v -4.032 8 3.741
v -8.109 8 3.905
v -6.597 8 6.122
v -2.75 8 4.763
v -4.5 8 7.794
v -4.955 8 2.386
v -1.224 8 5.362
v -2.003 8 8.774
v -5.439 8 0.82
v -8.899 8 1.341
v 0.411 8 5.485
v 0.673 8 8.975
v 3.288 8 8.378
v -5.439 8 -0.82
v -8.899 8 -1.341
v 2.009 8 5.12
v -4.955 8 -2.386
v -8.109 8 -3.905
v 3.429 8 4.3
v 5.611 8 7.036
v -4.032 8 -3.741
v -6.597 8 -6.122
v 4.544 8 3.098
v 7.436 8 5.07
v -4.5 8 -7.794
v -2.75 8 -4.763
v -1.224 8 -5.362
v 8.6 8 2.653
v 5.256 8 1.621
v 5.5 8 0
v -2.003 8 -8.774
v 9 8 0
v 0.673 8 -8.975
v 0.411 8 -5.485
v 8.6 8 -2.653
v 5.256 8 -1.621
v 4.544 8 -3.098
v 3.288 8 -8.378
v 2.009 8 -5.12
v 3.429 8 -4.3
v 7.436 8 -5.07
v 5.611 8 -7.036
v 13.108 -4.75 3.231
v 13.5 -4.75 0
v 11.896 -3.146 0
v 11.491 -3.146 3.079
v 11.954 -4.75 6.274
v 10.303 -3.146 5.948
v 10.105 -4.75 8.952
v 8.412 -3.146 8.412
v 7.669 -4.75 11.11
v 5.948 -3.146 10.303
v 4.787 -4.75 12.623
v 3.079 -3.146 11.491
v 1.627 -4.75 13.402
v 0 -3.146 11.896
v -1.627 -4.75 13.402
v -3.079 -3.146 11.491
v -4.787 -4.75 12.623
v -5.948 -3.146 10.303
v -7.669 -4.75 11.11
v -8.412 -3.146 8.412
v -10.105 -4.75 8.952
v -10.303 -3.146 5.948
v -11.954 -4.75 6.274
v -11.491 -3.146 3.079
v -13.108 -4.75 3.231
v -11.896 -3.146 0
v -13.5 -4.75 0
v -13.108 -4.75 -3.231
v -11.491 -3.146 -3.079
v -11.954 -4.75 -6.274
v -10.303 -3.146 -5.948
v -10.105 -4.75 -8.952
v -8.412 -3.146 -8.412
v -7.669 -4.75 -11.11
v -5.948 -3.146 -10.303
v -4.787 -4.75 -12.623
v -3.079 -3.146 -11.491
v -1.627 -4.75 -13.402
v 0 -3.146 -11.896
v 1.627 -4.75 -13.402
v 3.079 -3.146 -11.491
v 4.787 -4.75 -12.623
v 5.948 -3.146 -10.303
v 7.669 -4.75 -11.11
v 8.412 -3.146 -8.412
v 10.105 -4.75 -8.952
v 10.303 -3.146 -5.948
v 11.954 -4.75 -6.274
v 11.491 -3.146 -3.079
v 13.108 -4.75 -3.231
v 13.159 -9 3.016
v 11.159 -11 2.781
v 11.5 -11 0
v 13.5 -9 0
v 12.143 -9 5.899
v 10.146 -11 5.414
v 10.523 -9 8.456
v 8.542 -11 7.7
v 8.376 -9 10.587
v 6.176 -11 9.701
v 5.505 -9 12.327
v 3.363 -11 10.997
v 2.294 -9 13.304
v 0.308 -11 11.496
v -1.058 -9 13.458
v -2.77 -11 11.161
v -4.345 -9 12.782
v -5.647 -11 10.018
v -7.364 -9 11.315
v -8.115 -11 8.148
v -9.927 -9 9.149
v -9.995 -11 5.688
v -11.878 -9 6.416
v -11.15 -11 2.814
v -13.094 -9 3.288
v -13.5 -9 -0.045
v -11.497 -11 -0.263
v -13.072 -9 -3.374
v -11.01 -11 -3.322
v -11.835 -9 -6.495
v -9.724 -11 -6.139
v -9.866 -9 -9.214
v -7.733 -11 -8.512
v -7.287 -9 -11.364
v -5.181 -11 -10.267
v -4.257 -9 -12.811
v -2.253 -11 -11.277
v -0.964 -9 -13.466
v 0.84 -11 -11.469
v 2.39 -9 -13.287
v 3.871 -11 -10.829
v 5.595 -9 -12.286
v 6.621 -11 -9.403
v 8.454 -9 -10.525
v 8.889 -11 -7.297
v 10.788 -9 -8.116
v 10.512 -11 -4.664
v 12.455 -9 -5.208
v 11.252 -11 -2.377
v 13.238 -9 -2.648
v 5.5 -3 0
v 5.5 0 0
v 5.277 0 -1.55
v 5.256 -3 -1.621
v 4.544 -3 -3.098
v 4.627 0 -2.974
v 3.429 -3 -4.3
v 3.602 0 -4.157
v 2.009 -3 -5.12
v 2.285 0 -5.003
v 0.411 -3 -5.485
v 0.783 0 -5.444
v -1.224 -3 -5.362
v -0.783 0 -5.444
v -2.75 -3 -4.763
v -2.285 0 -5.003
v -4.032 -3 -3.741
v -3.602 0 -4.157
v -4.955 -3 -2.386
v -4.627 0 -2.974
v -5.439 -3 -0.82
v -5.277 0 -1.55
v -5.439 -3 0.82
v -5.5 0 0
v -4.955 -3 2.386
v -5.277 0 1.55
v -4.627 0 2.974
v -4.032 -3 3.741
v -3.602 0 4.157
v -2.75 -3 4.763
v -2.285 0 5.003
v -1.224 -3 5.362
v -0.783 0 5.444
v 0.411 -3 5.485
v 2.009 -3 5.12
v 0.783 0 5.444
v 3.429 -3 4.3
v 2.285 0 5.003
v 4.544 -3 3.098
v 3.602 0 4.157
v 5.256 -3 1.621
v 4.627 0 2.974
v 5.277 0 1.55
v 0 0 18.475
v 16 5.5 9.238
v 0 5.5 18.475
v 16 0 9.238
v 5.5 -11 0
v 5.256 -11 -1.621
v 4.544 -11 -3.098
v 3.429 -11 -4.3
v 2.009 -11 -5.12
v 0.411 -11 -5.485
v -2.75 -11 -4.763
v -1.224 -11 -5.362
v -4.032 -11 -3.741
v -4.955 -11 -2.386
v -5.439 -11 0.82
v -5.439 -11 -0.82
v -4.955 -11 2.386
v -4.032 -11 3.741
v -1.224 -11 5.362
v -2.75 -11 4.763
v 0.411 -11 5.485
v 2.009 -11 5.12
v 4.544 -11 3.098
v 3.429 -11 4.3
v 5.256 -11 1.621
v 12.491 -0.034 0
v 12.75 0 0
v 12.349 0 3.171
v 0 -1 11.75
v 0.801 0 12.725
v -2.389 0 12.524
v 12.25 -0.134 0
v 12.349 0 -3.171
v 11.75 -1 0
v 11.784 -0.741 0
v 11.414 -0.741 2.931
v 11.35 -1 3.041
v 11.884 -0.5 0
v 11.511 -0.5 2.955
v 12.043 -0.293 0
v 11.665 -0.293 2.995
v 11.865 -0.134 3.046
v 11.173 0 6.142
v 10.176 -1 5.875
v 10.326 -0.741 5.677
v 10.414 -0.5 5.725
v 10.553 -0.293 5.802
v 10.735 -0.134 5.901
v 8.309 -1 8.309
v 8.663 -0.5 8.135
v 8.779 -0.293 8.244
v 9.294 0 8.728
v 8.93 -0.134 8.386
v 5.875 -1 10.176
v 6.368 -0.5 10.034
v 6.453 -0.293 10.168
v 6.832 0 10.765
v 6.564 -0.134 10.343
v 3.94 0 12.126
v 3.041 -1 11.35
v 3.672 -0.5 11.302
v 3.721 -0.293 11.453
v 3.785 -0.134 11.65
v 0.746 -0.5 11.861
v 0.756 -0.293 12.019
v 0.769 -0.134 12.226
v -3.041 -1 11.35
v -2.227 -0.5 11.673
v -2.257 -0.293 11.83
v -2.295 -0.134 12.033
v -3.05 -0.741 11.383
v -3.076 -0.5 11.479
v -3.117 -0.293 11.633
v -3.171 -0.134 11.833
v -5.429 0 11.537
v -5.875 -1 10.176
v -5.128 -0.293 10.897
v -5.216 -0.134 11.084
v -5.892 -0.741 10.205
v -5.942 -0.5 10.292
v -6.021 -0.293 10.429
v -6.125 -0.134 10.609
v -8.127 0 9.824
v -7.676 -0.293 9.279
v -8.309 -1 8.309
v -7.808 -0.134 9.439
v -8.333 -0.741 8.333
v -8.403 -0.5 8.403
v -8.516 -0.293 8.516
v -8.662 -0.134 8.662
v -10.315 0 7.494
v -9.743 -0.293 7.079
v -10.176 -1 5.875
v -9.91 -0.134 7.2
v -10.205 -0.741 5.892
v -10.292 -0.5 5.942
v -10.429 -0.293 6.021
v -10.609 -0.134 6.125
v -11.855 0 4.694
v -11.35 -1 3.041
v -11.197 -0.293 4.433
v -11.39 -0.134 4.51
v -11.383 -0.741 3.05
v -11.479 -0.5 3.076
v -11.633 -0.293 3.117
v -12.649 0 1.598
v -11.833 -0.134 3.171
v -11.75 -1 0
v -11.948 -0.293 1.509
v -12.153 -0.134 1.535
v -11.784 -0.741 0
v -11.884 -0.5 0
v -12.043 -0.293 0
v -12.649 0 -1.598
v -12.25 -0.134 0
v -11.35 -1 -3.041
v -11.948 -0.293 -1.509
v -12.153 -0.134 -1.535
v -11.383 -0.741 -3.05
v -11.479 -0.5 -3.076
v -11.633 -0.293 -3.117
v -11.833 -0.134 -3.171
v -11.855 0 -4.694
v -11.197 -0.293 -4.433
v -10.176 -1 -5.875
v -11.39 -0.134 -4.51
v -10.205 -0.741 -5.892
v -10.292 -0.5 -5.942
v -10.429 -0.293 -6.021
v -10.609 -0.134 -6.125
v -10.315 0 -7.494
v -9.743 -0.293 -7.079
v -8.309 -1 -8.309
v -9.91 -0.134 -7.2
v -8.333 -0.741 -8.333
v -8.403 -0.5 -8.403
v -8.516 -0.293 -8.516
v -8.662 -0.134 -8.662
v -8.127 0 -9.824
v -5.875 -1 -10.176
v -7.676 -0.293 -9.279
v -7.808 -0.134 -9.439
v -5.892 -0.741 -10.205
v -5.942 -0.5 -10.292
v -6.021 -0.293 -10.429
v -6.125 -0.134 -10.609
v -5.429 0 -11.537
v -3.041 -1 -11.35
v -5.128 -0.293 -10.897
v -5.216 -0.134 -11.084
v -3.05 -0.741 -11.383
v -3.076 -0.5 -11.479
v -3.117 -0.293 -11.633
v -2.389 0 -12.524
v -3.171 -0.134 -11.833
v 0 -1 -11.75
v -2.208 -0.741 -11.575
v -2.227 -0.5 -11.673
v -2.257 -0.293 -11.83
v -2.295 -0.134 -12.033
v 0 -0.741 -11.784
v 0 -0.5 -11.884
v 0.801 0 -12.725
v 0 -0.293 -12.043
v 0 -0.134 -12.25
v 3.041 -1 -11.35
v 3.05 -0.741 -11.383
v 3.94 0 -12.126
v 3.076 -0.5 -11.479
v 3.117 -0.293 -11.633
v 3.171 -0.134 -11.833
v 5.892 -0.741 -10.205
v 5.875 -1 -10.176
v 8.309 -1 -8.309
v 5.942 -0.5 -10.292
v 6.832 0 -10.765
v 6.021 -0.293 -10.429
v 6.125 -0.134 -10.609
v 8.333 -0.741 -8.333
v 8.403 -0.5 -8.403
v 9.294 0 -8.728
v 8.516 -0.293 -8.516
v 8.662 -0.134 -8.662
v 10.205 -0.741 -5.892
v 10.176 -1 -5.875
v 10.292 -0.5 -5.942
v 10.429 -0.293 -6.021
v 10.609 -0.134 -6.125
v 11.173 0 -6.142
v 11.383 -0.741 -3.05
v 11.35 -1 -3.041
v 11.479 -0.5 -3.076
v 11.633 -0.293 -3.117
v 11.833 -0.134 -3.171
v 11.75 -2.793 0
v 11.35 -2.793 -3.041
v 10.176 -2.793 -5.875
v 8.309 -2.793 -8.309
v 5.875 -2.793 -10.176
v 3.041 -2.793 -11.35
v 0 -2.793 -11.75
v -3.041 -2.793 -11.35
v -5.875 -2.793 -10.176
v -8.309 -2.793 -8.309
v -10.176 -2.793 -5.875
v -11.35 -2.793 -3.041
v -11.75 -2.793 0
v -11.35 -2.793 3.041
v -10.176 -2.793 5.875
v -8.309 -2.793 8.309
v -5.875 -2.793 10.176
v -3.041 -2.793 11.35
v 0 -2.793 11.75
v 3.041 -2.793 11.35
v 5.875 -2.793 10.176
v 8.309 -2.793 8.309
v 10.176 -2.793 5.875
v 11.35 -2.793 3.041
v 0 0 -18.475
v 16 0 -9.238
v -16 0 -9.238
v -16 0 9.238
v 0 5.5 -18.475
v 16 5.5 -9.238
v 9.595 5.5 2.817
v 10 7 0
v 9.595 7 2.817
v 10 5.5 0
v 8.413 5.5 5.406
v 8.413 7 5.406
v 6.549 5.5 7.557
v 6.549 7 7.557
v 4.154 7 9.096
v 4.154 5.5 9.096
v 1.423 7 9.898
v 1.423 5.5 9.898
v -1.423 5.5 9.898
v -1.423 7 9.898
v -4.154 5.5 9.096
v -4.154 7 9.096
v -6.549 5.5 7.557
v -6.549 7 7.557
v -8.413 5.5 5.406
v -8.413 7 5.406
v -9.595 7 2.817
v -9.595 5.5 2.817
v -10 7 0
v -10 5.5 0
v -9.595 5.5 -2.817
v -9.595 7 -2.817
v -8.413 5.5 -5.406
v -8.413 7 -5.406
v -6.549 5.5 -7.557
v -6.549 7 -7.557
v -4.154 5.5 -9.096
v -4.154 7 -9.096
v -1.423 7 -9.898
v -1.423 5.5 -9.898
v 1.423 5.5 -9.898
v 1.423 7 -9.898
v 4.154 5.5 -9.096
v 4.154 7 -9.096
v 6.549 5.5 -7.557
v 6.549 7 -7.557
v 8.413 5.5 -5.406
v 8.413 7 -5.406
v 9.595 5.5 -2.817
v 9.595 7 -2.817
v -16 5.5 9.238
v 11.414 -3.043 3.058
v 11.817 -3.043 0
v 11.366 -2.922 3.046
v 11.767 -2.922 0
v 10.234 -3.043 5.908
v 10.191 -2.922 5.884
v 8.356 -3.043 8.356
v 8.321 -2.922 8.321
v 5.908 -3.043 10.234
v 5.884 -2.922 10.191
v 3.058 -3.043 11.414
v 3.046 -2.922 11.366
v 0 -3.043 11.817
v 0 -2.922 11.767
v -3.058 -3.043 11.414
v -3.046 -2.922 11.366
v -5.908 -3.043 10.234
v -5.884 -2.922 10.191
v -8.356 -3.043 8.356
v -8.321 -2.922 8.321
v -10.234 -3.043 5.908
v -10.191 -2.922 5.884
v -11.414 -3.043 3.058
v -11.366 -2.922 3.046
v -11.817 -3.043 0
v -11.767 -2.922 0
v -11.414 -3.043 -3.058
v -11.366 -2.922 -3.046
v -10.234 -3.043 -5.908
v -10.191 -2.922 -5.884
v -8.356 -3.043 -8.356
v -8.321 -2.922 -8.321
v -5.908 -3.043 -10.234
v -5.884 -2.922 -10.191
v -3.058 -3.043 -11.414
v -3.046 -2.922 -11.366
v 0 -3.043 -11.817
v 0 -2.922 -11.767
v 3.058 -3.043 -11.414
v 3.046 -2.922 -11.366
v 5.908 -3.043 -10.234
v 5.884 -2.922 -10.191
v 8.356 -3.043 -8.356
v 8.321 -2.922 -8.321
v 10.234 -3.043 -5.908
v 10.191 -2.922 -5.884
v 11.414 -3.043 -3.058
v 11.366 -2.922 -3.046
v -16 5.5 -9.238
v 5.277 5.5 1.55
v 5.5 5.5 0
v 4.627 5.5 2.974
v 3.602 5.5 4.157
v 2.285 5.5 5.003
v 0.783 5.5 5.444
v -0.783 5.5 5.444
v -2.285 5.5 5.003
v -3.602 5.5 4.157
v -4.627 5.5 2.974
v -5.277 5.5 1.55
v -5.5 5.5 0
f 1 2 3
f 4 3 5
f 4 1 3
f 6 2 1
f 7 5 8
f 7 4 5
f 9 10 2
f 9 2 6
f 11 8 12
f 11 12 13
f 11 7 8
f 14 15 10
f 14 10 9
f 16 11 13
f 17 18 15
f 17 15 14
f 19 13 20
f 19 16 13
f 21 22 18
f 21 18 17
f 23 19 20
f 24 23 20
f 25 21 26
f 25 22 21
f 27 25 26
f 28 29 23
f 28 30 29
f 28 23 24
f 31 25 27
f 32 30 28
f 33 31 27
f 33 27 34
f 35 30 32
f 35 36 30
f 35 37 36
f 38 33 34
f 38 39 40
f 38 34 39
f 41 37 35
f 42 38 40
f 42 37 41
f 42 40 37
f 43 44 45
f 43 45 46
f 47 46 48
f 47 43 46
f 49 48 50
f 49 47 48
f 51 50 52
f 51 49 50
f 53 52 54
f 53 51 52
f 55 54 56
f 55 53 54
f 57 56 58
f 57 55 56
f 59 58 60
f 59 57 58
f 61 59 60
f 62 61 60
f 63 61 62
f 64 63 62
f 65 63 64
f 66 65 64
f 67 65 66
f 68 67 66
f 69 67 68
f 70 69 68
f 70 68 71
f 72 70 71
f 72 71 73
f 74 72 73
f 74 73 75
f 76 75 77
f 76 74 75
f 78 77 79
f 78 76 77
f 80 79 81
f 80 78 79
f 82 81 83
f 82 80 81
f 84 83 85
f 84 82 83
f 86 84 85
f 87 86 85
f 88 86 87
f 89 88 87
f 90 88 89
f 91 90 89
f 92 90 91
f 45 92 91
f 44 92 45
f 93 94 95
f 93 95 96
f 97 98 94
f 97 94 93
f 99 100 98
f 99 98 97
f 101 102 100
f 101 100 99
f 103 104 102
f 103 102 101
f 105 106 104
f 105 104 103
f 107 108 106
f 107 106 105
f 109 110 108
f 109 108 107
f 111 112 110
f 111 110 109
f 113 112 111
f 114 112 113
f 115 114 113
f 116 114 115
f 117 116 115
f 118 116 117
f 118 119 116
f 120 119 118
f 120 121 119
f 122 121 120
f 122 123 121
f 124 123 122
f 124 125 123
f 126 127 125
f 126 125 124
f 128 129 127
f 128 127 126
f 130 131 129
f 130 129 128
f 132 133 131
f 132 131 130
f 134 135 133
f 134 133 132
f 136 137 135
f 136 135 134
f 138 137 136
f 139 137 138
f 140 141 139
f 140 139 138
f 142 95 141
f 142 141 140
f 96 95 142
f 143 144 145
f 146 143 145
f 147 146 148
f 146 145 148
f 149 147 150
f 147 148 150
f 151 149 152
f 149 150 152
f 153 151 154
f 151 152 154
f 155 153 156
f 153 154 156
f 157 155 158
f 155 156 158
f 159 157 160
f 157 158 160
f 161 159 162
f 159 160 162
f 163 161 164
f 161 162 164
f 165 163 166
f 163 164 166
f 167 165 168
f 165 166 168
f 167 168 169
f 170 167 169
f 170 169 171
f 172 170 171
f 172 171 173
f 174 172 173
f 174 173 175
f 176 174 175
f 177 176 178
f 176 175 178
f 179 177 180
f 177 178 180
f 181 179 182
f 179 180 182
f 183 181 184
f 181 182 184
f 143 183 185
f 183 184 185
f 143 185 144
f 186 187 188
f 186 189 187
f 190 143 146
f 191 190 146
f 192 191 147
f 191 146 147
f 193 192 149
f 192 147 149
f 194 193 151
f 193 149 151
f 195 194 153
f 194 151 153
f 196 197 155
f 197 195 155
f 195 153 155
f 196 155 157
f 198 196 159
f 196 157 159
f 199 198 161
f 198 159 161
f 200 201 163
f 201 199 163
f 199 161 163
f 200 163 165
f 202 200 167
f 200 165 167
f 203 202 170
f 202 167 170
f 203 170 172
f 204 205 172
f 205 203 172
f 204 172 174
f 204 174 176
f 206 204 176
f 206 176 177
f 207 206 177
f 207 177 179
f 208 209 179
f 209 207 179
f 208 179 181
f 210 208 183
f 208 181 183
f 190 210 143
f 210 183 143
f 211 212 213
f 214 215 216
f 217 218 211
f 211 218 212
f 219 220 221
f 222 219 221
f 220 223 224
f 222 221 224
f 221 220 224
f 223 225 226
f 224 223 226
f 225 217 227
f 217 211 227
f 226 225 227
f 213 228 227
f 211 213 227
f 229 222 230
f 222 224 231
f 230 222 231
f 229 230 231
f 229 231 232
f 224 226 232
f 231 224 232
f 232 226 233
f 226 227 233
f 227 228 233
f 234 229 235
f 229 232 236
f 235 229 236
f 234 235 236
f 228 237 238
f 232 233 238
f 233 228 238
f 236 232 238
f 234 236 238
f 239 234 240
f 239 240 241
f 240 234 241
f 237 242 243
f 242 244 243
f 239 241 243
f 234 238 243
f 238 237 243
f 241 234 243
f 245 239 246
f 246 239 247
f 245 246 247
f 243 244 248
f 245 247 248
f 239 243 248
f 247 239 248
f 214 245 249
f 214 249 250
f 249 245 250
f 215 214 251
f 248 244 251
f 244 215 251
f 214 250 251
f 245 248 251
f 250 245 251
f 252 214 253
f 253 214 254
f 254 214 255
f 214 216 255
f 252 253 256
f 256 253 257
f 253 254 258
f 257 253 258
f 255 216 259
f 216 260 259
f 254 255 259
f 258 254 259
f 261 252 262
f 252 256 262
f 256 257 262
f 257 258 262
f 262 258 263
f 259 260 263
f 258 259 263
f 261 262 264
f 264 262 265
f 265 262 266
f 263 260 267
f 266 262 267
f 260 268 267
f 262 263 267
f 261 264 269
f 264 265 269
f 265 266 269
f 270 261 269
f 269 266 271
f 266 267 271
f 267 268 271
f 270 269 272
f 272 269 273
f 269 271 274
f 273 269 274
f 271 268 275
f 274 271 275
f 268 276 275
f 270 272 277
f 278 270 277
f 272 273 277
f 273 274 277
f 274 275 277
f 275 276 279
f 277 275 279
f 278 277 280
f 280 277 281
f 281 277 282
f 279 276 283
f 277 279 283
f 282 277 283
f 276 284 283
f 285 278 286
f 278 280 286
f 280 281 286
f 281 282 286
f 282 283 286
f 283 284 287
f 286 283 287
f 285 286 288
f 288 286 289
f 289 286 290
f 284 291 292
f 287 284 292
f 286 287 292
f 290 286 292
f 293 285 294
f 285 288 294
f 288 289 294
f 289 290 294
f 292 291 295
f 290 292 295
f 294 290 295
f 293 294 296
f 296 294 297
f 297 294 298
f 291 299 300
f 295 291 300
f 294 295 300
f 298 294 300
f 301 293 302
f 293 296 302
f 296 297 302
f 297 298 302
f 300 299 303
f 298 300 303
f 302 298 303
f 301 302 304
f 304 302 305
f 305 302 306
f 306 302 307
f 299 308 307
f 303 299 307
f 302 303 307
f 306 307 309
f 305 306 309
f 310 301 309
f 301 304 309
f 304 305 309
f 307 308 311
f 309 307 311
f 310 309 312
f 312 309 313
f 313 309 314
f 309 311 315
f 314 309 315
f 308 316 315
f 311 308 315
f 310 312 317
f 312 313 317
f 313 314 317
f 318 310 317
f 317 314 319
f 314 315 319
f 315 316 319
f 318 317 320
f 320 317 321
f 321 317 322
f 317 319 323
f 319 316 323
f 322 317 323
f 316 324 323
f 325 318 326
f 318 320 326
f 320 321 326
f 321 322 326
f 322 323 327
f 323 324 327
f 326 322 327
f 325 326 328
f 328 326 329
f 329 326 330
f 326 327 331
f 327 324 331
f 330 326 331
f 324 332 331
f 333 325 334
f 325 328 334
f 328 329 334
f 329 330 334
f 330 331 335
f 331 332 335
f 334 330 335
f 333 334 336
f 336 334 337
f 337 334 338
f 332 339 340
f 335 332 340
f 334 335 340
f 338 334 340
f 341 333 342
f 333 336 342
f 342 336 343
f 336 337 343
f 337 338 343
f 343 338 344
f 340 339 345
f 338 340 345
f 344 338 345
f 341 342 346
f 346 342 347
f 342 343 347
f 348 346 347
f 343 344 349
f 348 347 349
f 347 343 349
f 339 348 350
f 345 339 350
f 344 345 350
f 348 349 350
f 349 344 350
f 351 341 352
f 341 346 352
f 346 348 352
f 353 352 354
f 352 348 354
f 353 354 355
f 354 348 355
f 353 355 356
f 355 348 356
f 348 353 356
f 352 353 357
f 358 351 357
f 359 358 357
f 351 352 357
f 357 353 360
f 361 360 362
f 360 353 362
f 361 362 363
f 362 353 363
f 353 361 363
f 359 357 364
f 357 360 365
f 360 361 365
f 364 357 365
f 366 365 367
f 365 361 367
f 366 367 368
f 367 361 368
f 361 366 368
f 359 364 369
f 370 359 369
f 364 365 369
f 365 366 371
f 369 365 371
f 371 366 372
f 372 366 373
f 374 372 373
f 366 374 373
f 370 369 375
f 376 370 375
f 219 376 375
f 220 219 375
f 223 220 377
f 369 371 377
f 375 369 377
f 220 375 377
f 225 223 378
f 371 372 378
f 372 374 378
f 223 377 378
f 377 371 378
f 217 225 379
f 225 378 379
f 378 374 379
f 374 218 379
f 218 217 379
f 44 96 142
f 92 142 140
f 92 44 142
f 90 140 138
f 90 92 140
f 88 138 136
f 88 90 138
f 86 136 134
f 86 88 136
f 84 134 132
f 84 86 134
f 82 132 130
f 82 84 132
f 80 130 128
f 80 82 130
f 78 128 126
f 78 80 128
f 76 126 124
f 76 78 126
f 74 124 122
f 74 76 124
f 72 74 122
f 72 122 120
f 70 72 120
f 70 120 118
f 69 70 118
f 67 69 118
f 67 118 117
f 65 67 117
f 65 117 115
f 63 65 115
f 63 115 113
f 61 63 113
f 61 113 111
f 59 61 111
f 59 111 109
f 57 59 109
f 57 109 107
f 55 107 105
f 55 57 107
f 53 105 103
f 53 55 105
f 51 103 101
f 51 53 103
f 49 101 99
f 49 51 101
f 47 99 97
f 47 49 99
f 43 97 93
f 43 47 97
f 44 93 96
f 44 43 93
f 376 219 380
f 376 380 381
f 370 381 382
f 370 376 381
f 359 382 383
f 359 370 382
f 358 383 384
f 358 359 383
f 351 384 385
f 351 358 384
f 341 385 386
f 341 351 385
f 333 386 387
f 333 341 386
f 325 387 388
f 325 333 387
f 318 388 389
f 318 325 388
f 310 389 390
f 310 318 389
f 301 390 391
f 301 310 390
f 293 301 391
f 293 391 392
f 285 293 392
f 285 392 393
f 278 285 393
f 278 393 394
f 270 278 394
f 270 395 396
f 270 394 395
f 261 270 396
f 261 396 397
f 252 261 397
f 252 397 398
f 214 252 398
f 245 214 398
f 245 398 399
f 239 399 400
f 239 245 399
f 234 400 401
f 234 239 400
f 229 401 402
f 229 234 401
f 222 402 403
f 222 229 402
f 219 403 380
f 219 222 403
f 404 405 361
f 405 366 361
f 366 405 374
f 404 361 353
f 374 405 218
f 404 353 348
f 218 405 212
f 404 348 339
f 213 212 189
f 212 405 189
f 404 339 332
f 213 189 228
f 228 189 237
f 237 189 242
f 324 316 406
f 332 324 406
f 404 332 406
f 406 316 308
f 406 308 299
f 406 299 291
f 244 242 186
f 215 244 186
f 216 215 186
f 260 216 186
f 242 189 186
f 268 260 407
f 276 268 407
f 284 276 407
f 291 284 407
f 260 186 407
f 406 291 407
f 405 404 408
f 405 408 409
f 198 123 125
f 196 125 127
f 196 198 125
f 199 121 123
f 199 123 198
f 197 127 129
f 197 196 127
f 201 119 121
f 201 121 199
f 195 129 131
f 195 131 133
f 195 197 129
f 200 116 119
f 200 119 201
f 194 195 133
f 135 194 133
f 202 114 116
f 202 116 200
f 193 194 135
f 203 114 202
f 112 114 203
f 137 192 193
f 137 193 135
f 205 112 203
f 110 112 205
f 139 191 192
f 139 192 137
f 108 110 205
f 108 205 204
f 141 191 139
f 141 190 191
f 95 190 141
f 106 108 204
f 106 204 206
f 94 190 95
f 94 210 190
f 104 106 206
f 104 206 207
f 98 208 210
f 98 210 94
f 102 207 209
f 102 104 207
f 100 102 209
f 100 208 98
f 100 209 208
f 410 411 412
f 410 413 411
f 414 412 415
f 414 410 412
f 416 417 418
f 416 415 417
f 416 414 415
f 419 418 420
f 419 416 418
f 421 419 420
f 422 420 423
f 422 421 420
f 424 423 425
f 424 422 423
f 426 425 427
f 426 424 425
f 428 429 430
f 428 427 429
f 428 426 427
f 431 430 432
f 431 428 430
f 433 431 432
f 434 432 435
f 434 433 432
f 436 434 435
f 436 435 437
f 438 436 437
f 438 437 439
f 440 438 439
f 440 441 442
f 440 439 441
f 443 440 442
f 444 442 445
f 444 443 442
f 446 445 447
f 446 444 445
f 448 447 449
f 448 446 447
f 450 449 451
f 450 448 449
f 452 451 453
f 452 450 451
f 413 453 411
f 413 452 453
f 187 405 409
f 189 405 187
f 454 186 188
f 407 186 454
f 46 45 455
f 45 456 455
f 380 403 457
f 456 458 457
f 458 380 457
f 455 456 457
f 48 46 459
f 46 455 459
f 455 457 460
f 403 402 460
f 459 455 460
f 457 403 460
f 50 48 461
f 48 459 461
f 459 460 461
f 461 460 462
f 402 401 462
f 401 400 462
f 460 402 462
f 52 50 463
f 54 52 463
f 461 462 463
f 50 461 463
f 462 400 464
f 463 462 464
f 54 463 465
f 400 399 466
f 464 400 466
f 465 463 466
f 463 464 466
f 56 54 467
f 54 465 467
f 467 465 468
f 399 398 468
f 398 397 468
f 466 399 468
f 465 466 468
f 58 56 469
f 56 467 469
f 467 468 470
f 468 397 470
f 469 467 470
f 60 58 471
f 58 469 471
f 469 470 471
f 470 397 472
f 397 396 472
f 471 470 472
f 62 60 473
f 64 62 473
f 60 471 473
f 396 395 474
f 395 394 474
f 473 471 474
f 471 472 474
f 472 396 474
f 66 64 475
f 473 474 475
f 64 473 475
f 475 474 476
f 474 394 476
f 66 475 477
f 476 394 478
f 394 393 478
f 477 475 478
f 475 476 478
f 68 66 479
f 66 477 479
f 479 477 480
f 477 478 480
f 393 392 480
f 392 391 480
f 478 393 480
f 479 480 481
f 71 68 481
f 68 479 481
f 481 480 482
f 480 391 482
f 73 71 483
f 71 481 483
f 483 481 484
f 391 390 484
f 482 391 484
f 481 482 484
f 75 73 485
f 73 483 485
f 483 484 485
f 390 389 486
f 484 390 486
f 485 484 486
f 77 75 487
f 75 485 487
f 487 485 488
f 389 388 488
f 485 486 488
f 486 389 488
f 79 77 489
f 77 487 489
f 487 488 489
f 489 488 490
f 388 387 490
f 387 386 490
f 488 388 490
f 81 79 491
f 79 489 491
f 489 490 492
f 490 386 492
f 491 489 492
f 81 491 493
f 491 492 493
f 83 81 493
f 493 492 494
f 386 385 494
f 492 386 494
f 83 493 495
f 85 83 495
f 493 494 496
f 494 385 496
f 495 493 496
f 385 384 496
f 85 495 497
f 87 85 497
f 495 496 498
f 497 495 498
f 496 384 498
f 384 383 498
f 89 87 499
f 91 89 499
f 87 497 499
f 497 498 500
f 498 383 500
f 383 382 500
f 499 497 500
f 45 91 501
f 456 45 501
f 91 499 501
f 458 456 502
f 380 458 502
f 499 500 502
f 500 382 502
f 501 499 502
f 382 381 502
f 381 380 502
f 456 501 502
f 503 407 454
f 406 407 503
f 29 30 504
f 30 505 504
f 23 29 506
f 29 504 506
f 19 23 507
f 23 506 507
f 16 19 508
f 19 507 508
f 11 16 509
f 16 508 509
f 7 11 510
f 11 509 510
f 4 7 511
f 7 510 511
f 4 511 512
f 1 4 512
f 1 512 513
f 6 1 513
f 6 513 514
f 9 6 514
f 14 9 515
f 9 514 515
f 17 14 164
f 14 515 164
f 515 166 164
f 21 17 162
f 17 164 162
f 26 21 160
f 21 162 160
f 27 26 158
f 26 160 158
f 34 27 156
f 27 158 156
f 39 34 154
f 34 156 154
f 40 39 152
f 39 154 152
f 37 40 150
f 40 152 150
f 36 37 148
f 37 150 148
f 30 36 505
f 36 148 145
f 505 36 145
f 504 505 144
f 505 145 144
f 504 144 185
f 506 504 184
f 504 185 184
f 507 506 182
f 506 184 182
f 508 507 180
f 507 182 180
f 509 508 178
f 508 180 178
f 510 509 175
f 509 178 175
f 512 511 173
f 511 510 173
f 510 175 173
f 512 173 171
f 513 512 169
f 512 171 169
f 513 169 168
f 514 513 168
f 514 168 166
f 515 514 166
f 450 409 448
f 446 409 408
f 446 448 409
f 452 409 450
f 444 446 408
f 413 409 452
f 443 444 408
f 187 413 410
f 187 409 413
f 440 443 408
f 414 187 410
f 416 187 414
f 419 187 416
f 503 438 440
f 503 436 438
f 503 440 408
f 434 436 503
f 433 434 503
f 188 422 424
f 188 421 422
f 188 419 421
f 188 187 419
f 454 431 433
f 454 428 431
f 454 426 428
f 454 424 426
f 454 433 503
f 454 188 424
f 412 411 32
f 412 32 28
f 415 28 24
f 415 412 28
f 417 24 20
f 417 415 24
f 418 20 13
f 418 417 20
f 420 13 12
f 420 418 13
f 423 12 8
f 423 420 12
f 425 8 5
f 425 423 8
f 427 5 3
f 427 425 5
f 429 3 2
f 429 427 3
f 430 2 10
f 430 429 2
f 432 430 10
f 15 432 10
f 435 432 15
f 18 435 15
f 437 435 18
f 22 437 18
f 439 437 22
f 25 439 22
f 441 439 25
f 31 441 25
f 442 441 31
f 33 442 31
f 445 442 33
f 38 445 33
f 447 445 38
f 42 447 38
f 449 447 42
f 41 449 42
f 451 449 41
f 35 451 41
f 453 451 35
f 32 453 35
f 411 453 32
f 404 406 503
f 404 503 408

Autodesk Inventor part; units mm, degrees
ref_plane "YZ Plane" through (0, 0, 0) normal (1, 0, 0) x (0, 1, 0)
ref_plane "XZ Plane" through (0, 0, 0) normal (0, 1, 0) x (-1, 0, 0)
ref_plane "XY Plane" through (0, 0, 0) normal (0, 0, 1) x (1, 0, 0)
sketch "Эскиз1" plane through (0, 0, 0) normal (0, 0, 1) x (1, 0, 0)
  point P0 (0, 0)
sketch "Эскиз2" plane through (0, 0, 0) normal (0, 1, 0) x (-1, 0, 0)
  line L0 (0, 18.4752) -> (16, 9.2376)
  line L1 (16, 9.2376) -> (16, -9.2376)
  line L2 (16, -9.2376) -> (0, -18.4752)
  line L3 (0, -18.4752) -> (-16, -9.2376)
  line L4 (-16, -9.2376) -> (-16, 9.2376)
  line L5 (-16, 9.2376) -> (0, 18.4752)
  circle A0 centre (0, 0) radius 5.5
  dimension "d0" = 32
  dimension "d1" = 11
extrude "Выдавливание1" add sketch "Эскиз2" along normal blind 5.5
sketch "Эскиз3" plane through (0, 5.5, 0) normal (0, 1, 0) x (1, 0, 0)
  circle A0 centre (0, 0) radius 5.5 projected
  circle A1 centre (0, 0) radius 10
  dimension "d4" = 20
extrude "Выдавливание2" add sketch "Эскиз3" along normal blind 2.5
chamfer "Фаска1" distance 1 angle 45 1 edges at (-10, 8, 0) measured on face at (8.3499, 8, 1.2365)
sketch "Эскиз4" plane through (0, 0, 0) normal (0, -1, 0) x (1, 0, 0)
  circle A0 centre (0, 0) radius 5.5 projected
  circle A1 centre (0, 0) radius 11.75
  dimension "d10" = 23.5
extrude "Выдавливание3" add sketch "Эскиз4" along normal blind 3
sketch "Эскиз5" plane through (0, -3, 0) normal (0, -1, 0) x (1, 0, 0)
  circle A0 centre (0, 0) radius 11.75 projected
  circle A1 centre (0, 0) radius 13.5
  dimension "d13" = 27
extrude "Выдавливание4" add sketch "Эскиз5" along normal blind 8
sketch "Эскиз6" plane through (0, -3, 0) normal (0, -1, 0) x (1, 0, 0)
  circle A0 centre (0, 0) radius 5.5 projected
  circle A1 centre (0, 0) radius 11.75 projected
extrude "Выдавливание5" add sketch "Эскиз6" along normal blind 8
thread "Резьба1" size "G 3/4-14" class "A" standard "BSP Pipe Threads" full length
chamfer "Фаска2" distance 2 angle 45 1 edges at (-13.5, -11, 0) measured on face at (12.6721, -11, -2.0142)
chamfer "Фаска3" distance 1.75 angle 45 1 edges at (-13.5, -3, 0)
fillet "Сопряжение1" radius 0.5 2 edges at (-11.7501, -3, 0) (-11.75, -3, 0)
fillet "Сопряжение2" radius 1 1 edges at (-11.75, 0, 0)
